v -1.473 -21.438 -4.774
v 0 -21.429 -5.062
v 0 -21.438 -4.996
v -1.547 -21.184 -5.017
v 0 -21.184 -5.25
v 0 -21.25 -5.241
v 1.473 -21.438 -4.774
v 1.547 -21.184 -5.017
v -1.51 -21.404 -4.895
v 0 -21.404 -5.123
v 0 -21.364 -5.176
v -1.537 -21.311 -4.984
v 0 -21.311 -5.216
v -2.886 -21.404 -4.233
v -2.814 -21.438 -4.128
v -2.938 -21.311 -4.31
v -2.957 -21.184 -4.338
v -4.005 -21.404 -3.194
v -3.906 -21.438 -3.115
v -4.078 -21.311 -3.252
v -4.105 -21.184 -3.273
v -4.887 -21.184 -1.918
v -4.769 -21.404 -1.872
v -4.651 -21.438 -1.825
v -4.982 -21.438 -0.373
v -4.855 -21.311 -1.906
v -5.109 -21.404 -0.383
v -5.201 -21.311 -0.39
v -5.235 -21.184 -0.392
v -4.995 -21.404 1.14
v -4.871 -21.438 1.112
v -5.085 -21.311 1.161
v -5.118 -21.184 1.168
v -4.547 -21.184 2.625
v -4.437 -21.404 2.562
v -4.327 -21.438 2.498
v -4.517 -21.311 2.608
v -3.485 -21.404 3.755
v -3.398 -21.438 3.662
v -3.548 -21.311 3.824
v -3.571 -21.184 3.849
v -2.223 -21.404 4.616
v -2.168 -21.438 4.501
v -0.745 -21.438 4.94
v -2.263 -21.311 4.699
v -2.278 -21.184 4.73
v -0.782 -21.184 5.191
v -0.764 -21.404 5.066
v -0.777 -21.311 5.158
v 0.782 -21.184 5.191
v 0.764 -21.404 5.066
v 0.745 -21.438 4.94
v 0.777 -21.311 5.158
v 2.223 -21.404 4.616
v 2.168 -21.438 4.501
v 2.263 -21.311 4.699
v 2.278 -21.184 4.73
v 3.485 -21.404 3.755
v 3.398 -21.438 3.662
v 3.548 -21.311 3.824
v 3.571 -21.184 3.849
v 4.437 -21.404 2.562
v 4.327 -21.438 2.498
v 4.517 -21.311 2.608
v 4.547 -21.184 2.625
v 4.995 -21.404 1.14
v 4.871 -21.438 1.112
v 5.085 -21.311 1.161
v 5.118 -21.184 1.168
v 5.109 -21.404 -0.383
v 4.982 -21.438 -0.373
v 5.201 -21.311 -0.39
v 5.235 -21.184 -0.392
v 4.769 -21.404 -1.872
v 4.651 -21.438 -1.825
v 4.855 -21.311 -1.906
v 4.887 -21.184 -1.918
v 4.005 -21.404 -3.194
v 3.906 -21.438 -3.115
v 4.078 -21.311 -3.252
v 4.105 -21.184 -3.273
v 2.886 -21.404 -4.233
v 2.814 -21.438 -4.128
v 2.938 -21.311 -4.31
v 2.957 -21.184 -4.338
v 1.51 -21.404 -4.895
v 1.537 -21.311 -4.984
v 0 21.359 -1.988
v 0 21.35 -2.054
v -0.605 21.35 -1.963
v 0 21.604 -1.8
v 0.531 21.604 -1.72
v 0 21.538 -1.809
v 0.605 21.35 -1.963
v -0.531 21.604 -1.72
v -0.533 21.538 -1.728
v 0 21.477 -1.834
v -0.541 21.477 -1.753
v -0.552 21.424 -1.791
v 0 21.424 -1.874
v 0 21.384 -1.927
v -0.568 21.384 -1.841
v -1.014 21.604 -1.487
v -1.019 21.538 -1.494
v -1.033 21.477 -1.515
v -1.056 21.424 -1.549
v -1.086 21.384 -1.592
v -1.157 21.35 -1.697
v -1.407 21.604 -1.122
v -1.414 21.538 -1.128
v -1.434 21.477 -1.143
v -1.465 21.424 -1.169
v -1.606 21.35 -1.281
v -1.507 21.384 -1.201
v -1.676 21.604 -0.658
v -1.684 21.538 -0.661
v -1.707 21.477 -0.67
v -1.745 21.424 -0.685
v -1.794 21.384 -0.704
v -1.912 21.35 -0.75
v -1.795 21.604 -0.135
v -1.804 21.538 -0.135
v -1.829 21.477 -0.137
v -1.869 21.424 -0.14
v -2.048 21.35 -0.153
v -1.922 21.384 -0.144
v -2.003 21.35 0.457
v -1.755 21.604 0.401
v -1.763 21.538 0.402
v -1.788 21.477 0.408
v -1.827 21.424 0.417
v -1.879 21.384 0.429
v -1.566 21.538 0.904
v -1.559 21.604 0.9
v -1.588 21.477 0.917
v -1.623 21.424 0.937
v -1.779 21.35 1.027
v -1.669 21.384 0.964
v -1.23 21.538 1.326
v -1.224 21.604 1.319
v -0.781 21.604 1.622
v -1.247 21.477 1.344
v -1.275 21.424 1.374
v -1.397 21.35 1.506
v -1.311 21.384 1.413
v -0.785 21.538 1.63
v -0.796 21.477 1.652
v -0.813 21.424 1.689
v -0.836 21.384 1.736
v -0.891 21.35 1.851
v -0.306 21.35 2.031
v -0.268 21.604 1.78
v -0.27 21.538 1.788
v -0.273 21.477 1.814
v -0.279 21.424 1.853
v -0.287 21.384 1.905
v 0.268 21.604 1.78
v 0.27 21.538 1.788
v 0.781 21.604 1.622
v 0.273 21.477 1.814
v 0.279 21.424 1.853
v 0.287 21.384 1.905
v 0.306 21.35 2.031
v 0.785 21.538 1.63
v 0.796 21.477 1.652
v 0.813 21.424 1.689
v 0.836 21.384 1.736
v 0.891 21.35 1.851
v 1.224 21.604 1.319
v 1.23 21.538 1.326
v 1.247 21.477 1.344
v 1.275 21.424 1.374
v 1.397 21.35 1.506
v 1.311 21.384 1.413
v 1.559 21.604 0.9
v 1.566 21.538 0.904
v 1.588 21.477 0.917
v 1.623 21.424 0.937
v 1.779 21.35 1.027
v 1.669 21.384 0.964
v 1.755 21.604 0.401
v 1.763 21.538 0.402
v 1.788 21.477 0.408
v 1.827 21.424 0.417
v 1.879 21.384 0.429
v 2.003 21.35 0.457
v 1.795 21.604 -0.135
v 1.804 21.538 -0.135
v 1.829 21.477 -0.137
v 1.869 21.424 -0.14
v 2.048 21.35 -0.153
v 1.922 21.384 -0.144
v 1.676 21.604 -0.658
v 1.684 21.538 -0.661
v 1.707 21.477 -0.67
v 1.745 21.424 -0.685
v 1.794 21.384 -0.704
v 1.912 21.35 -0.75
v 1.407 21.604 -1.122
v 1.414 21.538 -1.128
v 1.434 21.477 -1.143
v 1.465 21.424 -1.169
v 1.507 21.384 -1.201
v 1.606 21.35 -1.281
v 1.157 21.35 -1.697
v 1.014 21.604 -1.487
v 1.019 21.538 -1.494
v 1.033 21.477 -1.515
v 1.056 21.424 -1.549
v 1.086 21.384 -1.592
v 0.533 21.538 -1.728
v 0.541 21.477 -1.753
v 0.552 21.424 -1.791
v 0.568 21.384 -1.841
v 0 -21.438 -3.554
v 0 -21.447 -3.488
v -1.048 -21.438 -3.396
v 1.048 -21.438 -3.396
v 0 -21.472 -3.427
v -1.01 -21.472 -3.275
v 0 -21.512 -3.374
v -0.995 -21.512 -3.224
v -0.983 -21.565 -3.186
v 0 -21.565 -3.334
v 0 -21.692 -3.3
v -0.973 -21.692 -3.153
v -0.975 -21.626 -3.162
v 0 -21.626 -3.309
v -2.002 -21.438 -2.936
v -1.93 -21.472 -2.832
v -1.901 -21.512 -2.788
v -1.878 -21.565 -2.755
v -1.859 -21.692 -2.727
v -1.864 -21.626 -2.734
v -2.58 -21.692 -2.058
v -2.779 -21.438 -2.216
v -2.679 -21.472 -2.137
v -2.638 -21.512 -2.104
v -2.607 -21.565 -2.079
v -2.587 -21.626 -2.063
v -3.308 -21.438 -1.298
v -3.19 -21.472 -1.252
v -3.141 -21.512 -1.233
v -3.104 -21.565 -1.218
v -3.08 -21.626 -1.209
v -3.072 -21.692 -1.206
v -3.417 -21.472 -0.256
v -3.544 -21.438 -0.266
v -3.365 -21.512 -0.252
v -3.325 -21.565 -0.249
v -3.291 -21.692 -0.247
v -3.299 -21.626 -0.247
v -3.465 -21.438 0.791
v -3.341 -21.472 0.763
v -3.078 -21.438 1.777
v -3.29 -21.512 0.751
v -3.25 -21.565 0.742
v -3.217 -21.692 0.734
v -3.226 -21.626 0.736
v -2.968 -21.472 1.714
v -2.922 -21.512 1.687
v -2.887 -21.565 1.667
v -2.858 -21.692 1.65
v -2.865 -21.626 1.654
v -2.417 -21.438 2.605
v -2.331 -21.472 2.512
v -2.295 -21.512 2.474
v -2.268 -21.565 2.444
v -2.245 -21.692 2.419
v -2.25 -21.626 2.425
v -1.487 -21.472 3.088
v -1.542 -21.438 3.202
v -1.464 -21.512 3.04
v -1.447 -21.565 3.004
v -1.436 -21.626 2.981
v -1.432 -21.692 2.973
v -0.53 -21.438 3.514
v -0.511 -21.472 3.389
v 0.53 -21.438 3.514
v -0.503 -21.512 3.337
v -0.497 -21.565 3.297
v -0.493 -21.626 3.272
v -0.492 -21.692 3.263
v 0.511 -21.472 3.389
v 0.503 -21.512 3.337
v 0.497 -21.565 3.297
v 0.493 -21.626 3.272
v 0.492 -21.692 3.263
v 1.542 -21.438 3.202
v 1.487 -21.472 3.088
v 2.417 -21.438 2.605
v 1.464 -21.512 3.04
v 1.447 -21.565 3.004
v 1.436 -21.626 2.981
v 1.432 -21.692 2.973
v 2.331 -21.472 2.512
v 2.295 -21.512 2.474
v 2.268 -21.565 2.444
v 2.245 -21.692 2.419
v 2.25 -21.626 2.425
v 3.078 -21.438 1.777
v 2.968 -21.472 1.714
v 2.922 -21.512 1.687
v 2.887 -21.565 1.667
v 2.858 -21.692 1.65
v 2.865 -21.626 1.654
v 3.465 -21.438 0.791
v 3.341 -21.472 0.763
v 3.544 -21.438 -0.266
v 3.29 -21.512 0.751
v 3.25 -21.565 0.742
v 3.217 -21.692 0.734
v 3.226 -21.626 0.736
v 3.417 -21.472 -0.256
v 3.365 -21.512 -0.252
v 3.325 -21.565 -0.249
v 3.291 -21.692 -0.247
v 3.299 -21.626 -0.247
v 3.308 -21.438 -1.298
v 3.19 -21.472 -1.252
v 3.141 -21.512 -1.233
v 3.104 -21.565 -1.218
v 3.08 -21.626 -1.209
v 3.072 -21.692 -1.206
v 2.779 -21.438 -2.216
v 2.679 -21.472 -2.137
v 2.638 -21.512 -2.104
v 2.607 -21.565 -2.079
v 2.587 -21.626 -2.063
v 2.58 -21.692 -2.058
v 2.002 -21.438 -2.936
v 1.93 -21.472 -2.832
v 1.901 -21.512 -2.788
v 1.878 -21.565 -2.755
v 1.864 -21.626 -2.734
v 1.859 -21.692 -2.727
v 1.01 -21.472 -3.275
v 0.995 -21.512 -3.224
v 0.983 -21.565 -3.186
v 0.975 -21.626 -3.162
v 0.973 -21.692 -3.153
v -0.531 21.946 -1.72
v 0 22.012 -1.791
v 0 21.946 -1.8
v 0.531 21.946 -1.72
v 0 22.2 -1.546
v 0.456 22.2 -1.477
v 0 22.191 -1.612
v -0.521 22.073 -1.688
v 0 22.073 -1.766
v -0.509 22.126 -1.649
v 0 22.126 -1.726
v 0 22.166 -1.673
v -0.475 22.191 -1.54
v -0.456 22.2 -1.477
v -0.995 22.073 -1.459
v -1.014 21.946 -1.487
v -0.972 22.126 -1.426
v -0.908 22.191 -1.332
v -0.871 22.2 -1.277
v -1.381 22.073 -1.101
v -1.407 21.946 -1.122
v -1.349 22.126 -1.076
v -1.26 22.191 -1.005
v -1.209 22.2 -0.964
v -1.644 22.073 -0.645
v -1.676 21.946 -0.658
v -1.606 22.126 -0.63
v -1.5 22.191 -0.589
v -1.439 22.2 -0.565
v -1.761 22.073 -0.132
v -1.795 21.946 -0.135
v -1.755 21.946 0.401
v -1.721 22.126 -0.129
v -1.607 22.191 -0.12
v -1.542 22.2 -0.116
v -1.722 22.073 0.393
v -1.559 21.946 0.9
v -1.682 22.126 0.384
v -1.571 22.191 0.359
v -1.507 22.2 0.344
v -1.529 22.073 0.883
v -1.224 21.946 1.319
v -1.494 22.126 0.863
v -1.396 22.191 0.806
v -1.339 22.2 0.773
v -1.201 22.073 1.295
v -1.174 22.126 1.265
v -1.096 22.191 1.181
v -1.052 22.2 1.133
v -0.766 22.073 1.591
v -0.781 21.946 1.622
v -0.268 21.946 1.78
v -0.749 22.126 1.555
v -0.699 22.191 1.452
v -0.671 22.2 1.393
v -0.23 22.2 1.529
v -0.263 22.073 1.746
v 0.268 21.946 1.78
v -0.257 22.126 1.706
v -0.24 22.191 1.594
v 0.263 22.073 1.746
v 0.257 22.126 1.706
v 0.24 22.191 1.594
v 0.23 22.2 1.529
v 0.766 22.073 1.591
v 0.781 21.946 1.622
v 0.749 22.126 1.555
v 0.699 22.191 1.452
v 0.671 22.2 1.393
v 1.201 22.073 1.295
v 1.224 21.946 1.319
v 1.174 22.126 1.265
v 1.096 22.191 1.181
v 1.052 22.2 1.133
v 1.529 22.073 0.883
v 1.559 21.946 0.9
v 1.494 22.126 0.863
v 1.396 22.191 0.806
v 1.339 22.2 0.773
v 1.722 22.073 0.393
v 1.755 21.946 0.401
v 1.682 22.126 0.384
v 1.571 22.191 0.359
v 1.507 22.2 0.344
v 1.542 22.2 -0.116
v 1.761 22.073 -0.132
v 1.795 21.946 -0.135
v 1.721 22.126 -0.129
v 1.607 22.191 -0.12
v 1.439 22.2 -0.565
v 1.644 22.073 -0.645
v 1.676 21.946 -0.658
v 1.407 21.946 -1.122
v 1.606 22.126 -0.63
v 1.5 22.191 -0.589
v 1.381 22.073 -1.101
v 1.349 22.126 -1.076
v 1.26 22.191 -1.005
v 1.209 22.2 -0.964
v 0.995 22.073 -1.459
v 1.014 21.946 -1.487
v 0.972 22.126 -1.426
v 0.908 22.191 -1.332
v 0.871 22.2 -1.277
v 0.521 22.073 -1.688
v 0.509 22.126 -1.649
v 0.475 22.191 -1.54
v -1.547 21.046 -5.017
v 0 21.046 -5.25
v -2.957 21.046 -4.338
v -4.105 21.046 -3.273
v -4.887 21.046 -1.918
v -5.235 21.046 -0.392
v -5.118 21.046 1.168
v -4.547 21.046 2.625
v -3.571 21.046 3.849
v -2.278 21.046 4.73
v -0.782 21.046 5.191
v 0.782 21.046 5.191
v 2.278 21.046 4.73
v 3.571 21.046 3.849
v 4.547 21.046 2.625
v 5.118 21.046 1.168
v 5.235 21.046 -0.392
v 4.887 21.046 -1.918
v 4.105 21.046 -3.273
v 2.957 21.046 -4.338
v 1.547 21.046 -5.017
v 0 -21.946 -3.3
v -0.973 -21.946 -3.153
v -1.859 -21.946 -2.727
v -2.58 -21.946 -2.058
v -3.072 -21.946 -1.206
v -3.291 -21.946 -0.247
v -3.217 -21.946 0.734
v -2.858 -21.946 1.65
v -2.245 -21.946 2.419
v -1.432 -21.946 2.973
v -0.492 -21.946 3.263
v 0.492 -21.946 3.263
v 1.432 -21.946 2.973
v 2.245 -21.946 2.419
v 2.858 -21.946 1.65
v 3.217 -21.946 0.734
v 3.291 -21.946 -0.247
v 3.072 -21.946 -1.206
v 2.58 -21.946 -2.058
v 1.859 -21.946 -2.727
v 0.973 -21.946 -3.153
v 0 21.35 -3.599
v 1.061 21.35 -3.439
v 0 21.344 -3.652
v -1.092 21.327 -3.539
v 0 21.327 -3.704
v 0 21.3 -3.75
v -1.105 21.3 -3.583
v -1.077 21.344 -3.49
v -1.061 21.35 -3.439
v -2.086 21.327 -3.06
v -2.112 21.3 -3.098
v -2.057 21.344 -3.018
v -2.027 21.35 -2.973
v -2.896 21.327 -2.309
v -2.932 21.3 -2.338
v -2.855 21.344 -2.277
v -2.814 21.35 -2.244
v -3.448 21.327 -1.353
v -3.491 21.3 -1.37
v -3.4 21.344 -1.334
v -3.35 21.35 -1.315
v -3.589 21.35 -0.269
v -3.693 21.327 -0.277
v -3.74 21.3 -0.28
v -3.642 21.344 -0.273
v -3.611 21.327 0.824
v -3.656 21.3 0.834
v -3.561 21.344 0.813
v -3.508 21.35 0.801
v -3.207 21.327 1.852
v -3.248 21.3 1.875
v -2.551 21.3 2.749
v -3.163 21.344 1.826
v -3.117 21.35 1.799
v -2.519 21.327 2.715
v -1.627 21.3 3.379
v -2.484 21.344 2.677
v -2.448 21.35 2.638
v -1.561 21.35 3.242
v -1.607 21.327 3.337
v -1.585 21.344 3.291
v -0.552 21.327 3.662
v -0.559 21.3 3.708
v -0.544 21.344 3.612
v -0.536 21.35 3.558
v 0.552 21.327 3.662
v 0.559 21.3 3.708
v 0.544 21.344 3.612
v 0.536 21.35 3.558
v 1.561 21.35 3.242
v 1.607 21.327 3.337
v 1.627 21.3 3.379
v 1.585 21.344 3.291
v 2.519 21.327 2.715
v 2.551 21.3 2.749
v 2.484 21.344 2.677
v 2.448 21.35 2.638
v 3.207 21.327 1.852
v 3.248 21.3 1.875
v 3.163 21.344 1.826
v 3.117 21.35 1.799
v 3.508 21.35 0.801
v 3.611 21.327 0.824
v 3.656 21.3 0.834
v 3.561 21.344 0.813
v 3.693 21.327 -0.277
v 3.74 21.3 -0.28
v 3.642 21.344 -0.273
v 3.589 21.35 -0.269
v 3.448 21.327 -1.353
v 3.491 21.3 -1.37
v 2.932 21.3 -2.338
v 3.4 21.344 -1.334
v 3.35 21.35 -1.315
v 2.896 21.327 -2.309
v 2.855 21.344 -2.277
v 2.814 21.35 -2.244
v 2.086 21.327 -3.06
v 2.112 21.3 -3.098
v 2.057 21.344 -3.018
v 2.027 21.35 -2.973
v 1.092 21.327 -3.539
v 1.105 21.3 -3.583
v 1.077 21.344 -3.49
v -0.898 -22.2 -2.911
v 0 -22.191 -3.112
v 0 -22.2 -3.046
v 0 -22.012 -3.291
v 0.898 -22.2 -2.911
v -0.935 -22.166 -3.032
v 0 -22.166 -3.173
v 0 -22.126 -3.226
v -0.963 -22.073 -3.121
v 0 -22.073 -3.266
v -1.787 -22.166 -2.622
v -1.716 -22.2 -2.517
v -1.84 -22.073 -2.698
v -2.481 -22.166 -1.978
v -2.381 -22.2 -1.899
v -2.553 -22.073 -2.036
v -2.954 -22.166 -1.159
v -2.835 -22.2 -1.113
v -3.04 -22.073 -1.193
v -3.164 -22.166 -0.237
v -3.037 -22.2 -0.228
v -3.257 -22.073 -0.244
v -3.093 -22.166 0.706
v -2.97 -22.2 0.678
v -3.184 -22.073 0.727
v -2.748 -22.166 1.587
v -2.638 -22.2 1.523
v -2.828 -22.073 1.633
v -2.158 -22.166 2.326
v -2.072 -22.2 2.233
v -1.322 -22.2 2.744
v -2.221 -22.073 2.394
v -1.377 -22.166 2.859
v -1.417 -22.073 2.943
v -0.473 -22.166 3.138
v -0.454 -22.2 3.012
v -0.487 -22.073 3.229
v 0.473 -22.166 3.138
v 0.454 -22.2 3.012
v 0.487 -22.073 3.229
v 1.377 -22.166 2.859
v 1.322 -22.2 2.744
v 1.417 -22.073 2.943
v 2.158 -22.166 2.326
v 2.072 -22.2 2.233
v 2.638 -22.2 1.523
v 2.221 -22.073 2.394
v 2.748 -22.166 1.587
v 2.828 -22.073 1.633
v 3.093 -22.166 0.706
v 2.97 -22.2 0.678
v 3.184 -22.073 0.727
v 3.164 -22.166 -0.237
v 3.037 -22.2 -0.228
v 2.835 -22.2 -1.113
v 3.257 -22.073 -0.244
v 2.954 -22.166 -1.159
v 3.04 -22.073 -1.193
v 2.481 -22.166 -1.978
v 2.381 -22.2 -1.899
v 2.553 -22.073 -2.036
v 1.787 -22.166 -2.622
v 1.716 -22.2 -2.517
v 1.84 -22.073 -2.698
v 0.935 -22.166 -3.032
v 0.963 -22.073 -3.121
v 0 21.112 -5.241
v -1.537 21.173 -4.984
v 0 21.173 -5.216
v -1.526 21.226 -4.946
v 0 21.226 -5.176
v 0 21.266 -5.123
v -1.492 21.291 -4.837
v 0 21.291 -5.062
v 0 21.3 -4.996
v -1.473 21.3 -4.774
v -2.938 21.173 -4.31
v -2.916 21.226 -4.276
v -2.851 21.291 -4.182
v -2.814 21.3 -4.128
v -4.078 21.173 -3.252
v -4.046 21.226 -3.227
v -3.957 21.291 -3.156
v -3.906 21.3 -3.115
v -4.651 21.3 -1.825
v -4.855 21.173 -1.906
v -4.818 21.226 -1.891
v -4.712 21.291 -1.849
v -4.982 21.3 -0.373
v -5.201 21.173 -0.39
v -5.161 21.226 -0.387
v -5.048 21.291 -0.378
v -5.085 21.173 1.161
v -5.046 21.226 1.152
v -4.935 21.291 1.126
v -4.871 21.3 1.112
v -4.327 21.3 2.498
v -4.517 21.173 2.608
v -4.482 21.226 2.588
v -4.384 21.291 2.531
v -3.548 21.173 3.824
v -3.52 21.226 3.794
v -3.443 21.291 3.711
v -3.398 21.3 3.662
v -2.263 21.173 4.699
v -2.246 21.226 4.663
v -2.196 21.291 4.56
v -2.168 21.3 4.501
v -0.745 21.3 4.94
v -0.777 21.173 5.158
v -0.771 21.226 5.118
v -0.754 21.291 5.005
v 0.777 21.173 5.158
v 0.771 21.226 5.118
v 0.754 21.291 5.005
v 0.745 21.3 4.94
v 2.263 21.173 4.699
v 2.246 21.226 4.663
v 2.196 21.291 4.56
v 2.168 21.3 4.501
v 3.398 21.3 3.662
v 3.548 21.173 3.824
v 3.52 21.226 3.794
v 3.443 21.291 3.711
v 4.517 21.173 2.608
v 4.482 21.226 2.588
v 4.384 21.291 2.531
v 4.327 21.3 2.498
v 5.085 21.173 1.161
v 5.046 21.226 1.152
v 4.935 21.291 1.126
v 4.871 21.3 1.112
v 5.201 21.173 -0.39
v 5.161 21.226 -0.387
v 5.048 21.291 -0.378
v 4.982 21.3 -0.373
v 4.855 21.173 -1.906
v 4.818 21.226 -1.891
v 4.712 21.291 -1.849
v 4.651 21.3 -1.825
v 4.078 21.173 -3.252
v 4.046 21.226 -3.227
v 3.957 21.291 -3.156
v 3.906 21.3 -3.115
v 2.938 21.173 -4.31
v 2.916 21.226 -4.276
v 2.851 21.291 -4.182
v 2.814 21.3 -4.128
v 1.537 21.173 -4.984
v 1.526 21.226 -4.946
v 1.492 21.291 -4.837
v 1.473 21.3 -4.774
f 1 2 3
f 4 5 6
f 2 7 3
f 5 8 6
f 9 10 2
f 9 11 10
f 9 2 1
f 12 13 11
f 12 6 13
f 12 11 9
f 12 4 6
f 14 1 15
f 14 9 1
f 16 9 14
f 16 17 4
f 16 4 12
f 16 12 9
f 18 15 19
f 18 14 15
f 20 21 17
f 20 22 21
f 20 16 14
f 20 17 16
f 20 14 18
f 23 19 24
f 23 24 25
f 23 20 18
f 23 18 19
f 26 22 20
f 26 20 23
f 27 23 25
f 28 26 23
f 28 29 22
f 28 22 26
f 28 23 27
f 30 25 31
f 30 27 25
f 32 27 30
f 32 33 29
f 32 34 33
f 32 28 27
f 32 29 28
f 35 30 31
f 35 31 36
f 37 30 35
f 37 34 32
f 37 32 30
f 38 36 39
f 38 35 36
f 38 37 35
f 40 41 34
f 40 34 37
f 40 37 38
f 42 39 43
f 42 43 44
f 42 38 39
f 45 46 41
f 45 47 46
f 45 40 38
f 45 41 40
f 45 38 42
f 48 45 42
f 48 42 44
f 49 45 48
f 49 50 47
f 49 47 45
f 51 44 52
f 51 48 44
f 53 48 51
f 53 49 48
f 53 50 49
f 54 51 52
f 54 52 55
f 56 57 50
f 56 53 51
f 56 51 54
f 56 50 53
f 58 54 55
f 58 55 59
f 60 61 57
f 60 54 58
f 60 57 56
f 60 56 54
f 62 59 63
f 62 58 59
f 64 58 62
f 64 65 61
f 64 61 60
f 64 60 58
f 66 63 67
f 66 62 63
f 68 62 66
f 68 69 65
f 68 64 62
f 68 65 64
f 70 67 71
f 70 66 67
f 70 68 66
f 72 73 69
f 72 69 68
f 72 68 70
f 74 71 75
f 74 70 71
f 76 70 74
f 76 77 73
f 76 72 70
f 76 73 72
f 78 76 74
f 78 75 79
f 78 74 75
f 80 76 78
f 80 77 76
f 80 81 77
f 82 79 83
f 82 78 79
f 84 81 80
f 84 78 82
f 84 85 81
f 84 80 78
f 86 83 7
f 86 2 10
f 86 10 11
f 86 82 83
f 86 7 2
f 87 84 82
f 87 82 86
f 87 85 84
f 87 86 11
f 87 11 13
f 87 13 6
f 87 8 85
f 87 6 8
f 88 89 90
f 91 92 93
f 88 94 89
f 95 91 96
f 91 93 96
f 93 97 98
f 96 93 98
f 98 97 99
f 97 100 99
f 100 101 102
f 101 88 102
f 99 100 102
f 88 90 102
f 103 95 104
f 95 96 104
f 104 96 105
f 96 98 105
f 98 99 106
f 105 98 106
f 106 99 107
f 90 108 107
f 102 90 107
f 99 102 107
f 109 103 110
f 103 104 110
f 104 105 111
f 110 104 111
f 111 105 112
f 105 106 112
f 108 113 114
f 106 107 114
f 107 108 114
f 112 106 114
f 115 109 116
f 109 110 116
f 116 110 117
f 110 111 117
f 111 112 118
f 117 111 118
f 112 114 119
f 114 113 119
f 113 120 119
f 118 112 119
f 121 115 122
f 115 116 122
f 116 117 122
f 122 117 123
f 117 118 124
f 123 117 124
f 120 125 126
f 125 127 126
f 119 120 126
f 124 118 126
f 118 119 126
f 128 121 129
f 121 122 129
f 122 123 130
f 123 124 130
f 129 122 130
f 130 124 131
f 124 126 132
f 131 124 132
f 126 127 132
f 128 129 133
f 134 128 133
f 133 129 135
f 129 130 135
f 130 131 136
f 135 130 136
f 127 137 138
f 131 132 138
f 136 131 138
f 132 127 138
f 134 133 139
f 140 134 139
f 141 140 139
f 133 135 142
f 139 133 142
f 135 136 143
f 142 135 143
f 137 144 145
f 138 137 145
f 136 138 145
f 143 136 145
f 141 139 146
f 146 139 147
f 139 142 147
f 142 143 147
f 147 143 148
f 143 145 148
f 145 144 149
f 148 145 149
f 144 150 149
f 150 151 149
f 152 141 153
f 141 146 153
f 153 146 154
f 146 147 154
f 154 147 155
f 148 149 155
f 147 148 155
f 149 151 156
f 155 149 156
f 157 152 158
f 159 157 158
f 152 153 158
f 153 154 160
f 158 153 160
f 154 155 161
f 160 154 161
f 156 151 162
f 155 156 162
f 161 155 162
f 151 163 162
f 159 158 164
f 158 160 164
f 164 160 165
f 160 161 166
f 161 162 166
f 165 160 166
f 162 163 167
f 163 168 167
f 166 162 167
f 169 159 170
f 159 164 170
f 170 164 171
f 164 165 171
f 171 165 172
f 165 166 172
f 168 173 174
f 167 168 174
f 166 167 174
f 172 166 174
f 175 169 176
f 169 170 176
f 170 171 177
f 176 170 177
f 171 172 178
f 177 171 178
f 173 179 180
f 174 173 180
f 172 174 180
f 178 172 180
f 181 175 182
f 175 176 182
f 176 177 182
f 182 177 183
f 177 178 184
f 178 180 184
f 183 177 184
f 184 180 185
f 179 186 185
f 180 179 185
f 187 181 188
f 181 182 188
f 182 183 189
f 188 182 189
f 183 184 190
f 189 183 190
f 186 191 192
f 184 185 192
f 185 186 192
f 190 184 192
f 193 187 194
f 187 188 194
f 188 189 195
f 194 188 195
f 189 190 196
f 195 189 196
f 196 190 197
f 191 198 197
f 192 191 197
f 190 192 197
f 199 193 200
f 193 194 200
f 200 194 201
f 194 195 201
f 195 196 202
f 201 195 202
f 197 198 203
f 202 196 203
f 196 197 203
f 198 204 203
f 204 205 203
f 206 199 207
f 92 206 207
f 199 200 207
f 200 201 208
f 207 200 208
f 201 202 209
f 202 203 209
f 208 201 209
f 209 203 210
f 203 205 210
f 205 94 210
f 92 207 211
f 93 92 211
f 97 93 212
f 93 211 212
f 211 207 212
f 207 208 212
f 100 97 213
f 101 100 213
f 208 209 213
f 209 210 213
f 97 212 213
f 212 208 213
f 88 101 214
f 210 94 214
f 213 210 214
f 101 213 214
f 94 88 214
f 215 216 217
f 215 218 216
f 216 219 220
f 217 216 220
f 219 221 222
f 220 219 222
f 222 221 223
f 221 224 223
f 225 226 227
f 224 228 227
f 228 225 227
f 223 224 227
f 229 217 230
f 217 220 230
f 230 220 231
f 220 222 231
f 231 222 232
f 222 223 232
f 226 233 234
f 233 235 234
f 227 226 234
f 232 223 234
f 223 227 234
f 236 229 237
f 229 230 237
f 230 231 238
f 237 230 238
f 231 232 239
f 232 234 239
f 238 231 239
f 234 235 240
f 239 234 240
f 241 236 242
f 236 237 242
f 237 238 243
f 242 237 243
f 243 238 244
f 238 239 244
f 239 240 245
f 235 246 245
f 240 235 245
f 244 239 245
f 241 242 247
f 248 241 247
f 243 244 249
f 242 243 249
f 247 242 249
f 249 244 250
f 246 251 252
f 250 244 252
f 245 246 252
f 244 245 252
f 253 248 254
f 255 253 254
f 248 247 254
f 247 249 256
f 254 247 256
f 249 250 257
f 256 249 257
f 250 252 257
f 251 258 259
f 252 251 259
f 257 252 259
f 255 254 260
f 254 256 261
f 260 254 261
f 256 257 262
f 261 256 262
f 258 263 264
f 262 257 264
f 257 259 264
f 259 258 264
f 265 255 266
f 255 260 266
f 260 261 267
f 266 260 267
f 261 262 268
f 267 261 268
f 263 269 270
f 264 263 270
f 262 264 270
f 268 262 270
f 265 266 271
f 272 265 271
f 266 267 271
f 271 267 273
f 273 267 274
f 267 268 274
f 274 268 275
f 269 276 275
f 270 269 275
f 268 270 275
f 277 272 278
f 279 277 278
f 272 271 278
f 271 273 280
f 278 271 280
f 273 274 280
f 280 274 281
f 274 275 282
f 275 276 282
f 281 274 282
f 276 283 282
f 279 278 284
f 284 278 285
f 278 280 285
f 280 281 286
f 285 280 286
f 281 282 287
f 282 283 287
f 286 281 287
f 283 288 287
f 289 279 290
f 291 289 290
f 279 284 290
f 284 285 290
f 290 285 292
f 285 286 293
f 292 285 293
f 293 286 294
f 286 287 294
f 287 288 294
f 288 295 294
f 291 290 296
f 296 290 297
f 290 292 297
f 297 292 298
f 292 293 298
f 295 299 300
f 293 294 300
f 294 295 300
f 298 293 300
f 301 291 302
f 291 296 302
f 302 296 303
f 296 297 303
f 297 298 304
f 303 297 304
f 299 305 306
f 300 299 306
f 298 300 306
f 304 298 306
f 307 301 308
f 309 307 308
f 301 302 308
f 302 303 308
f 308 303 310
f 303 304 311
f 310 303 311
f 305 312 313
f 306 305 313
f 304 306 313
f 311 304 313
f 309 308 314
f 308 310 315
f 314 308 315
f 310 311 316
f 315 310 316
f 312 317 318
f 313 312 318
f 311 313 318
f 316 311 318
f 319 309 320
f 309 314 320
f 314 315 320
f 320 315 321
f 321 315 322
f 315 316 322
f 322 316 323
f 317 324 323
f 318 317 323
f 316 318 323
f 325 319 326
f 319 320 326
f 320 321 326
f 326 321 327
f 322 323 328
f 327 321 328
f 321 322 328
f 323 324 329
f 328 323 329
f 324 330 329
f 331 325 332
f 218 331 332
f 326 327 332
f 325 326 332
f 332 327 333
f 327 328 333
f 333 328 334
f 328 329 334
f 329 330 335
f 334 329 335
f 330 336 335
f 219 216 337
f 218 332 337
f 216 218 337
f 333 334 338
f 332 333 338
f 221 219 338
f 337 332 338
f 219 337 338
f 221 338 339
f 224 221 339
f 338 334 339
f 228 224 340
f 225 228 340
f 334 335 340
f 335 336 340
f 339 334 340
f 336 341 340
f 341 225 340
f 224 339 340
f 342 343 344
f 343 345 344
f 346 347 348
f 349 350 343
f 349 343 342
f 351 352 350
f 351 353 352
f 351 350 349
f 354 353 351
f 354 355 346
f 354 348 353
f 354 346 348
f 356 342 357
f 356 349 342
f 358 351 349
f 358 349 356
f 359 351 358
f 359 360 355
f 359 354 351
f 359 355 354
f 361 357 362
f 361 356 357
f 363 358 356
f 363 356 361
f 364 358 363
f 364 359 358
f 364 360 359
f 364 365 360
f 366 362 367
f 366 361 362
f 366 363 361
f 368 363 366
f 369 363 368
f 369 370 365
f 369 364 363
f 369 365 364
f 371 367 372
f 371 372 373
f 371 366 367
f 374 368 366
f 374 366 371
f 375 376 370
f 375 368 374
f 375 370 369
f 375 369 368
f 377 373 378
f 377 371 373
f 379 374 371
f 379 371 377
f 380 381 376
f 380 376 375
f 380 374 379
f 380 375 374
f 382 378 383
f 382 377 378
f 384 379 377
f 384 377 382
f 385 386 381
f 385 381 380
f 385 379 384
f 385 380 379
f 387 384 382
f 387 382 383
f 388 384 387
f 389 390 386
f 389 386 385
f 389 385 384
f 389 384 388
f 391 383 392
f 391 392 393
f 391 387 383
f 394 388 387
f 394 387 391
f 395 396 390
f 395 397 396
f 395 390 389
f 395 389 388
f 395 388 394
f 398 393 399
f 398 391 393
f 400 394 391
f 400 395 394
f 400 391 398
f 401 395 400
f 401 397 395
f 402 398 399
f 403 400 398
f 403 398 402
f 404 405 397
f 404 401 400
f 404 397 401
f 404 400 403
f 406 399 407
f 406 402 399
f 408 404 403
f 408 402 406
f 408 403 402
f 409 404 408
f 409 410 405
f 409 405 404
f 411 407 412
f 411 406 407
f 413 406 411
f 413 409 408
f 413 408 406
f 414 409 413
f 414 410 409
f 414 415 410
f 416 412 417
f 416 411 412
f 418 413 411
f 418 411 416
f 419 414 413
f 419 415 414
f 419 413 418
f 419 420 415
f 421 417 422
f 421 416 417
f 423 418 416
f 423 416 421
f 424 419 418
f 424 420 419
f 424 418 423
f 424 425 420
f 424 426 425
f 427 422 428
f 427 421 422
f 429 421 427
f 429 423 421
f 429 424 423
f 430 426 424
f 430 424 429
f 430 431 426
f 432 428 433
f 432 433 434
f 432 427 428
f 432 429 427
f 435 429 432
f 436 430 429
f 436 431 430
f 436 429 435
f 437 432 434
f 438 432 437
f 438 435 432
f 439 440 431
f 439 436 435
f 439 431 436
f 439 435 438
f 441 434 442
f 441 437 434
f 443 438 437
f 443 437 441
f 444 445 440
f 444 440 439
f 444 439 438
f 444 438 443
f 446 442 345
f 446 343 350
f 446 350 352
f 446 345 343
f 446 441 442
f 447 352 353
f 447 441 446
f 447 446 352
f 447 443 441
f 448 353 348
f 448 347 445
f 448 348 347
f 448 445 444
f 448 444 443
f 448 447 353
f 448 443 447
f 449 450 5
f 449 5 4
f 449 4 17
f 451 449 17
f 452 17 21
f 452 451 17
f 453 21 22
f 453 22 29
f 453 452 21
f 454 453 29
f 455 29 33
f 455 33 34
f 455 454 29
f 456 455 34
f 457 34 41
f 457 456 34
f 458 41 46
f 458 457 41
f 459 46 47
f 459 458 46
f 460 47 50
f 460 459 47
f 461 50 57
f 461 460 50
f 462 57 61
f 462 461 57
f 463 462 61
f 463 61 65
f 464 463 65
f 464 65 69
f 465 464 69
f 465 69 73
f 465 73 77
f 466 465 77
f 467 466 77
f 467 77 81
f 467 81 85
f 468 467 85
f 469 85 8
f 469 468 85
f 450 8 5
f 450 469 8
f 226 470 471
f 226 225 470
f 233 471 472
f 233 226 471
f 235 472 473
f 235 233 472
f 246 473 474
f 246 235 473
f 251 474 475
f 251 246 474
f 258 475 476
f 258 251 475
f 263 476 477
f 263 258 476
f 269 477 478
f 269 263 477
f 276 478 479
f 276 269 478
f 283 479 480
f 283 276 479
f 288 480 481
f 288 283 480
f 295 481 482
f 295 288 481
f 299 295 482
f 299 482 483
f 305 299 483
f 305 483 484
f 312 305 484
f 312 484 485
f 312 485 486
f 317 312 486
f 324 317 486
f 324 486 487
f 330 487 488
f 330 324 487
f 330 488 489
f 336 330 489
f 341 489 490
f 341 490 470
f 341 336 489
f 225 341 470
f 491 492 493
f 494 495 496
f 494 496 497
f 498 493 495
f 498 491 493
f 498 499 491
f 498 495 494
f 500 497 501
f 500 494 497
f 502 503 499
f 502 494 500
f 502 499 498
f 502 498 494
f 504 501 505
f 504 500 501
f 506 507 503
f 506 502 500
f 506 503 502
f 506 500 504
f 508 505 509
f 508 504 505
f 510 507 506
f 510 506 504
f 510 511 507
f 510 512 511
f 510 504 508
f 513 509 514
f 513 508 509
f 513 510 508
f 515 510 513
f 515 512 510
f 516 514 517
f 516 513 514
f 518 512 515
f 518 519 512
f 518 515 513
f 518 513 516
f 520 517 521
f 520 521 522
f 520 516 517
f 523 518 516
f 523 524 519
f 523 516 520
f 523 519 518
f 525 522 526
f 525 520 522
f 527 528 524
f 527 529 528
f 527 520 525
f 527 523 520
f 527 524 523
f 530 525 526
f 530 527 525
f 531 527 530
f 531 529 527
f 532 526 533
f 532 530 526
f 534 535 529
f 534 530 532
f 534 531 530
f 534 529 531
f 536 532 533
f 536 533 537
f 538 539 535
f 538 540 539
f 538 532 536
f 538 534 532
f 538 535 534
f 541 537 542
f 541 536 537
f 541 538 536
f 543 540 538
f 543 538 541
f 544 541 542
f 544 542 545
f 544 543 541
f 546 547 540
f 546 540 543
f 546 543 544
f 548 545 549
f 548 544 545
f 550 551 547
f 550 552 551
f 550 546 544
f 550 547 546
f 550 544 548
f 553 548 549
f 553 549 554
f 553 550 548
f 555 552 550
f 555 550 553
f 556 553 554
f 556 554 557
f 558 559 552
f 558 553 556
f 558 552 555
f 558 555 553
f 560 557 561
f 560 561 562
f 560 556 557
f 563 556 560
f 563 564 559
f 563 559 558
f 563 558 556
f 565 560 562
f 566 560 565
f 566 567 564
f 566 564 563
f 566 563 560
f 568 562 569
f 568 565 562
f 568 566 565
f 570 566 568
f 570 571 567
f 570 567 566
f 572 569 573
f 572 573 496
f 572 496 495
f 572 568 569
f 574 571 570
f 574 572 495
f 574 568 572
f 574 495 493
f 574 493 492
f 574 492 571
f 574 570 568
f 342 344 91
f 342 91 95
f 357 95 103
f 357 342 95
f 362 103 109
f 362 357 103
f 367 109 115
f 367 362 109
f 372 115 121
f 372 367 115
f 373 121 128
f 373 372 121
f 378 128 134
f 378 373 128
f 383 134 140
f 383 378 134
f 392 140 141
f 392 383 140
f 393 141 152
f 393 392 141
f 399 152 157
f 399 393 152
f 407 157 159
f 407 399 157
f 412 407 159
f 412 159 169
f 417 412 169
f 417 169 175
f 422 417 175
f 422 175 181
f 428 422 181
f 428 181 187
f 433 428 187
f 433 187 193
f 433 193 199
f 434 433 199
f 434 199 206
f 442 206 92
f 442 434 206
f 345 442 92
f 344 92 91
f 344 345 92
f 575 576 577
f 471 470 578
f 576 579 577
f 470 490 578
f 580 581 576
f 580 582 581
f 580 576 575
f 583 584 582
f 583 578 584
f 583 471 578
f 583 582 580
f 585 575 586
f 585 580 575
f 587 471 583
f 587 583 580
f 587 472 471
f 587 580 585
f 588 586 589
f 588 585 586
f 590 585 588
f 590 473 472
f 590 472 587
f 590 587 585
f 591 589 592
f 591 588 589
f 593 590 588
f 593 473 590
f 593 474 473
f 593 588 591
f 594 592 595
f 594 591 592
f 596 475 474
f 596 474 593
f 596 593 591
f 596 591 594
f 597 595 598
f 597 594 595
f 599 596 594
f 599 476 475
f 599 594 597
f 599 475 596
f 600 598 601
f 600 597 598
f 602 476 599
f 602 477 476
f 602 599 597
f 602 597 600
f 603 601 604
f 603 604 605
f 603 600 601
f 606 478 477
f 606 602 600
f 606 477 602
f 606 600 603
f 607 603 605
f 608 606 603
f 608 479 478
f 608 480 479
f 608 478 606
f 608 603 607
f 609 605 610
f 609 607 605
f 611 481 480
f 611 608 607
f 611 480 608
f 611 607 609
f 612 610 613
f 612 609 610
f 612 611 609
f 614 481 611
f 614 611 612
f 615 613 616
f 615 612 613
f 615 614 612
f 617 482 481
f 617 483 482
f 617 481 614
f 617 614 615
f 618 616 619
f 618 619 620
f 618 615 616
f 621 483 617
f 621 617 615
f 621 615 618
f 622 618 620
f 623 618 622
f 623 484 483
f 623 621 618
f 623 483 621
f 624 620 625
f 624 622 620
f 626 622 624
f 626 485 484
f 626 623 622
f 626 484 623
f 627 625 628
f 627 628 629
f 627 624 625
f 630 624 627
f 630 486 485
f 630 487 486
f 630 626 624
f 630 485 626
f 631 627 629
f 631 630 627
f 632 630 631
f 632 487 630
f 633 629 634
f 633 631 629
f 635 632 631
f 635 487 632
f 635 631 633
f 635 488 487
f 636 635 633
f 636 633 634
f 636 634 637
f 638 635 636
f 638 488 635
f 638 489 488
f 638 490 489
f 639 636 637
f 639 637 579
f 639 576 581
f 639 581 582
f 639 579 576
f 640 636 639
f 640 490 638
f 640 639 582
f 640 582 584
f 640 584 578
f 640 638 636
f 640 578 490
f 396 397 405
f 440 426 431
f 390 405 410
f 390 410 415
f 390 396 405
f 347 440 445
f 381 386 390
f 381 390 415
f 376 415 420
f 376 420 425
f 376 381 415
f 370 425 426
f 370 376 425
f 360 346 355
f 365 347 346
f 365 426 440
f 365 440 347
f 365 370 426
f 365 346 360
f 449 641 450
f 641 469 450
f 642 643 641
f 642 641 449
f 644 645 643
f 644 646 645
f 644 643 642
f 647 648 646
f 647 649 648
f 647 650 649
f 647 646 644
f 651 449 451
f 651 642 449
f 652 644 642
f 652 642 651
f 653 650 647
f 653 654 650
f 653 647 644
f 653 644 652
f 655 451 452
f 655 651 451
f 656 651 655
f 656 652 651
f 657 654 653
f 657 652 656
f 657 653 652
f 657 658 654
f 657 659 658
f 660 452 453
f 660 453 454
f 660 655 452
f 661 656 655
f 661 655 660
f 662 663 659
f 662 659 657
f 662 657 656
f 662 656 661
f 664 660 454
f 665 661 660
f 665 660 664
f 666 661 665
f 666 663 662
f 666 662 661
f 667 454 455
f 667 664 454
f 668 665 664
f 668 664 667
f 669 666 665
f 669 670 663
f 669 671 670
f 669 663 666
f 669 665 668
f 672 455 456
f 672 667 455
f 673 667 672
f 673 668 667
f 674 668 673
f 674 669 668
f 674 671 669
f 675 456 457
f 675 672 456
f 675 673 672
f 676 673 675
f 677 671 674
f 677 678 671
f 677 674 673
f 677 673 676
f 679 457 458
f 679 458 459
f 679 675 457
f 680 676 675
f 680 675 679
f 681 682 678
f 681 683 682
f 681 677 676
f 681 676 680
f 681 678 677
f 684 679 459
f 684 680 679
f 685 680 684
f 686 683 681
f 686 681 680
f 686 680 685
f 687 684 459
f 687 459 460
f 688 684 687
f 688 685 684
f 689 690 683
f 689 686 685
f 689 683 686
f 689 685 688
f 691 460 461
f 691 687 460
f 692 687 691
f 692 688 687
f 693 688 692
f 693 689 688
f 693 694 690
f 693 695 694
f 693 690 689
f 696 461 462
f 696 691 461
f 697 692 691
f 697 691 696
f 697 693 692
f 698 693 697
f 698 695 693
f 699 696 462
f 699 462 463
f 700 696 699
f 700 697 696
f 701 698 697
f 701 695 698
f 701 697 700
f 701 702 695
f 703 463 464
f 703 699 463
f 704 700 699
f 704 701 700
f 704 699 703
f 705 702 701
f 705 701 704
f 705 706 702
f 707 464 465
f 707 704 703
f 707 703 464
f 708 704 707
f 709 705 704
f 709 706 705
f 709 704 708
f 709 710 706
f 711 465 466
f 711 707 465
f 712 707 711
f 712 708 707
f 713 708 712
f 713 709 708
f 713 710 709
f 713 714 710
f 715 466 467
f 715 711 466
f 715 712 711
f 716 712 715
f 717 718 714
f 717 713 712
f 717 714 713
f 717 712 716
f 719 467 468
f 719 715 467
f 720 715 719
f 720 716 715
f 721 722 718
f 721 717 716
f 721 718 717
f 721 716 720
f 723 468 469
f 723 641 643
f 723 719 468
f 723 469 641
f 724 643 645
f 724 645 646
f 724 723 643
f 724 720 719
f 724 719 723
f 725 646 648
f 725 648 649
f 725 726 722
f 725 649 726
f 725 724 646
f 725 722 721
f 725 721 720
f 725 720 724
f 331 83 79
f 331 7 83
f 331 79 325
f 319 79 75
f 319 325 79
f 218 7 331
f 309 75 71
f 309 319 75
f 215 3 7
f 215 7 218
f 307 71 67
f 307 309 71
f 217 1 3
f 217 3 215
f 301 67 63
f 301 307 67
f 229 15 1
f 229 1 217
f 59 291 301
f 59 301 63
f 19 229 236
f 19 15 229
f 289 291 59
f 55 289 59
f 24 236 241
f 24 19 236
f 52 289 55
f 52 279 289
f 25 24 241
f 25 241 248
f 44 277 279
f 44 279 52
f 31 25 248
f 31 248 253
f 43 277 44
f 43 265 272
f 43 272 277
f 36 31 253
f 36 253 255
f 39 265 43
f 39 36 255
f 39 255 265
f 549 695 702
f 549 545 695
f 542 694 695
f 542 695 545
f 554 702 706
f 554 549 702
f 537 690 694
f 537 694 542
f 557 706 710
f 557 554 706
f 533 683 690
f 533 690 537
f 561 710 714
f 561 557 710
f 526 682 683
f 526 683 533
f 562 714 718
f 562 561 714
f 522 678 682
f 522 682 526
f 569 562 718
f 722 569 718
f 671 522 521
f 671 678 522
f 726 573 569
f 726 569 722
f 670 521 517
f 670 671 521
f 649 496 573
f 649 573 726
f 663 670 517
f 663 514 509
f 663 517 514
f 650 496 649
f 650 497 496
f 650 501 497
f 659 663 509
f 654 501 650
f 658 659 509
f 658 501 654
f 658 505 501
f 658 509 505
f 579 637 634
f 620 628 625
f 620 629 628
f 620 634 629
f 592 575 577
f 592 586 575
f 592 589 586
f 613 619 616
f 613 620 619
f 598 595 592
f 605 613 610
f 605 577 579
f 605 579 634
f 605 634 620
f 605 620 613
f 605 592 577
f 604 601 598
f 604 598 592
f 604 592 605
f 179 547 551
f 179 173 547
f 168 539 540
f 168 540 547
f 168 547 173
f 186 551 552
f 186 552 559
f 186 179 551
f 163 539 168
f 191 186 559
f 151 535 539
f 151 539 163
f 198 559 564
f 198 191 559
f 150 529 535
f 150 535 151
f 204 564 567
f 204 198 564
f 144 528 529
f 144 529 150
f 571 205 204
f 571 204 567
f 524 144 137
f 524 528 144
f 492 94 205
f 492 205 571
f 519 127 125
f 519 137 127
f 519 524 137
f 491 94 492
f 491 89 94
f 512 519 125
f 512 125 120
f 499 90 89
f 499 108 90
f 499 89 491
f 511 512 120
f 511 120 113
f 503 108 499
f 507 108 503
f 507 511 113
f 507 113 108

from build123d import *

# Parameters (mm, degrees)
FILLET1_R = 0.254
FILLET2_R = 0.254


with BuildPart() as part:
    # Sketch2 → Revolve1 (revolve)
    with BuildSketch(Plane.XY, mode=Mode.PRIVATE) as revolve1_sk:
        Polygon((0, -22.2), (3.3, -22.2), (3.3, -21.438), (5.25, -21.438), (5.25, 21.3), (3.75, 21.3), (3.75, 21.35), (1.8, 21.35), (1.8, 22.2), (0, 22.2), align=None)
    revolve(revolve1_sk.sketch.rotate(Axis((0, -28.28023606, 0), (0, 1, 0)), 90), axis=Axis((0, -28.28023606, 0), (0, 1, 0)))

    # Fillet1
    fillet1_edges = [part.edges().sort_by_distance(p)[0] for p in [
        (0, 21.3, 5.25),
        (0, -21.438, 5.25),
    ]]
    fillet(fillet1_edges, radius=FILLET1_R)

    # Fillet2
    # the kernel refuses this fillet: 0.254 mm, written as the material it adds along each edge
    with BuildSketch(Plane(origin=(0, 21.35, 0), x_dir=(0, 0, -1), z_dir=(1, 0, 0))) as fillet2_piece_1:
        with BuildLine():
            CenterArc((1.8 + FILLET2_R, FILLET2_R), FILLET2_R, 180, 90)
            Line((1.8, FILLET2_R), (1.8, 0))
            Line((1.8, 0), (1.8 + FILLET2_R, 0))
        make_face()
    revolve(axis=Axis((0, 21.35, 0), (0, 1, 0)))
    with BuildSketch(Plane(origin=(0, -21.438, 0), x_dir=(0, 0, -1), z_dir=(1, 0, 0))) as fillet2_piece_2:
        with BuildLine():
            CenterArc((3.3 + FILLET2_R, -FILLET2_R), FILLET2_R, 90, 90)
            Line((3.3, -FILLET2_R), (3.3, 0))
            Line((3.3, 0), (3.3 + FILLET2_R, 0))
        make_face()
    revolve(axis=Axis((0, -21.438, 0), (0, 1, 0)))
    # the kernel refuses this fillet: 0.254 mm, written as the material it takes off along each edge
    with BuildSketch(Plane(origin=(0, -22.2, 0), x_dir=(0, 0, -1), z_dir=(1, 0, 0))) as fillet2_2_piece_1:
        with BuildLine():
            CenterArc((3.3 - FILLET2_R, FILLET2_R), FILLET2_R, 270, 90)
            Line((3.3 - FILLET2_R, 0), (3.3, 0))
            Line((3.3, 0), (3.3, FILLET2_R))
        make_face()
    revolve(axis=Axis((0, -22.2, 0), (0, 1, 0)), mode=Mode.SUBTRACT)
    with BuildSketch(Plane(origin=(0, 22.2, 0), x_dir=(0, 0, -1), z_dir=(1, 0, 0))) as fillet2_2_piece_2:
        with BuildLine():
            CenterArc((1.8 - FILLET2_R, -FILLET2_R), FILLET2_R, 0, 90)
            Line((1.8 - FILLET2_R, 0), (1.8, 0))
            Line((1.8, 0), (1.8, -FILLET2_R))
        make_face()
    revolve(axis=Axis((0, 22.2, 0), (0, 1, 0)), mode=Mode.SUBTRACT)
    with BuildSketch(Plane(origin=(0, 21.35, 0), x_dir=(0, 0, -1), z_dir=(1, 0, 0))) as fillet2_2_piece_3:
        with BuildLine():
            CenterArc((3.59867254, -0.254), FILLET2_R, 53.431928983, 36.568071017)
            Line((3.59867254, 0), (3.75, 0))
            Line((3.75, 0), (3.75, -0.05))
        make_face()
    revolve(axis=Axis((0, 21.35, 0), (0, 1, 0)), mode=Mode.SUBTRACT)


solid = part.part
